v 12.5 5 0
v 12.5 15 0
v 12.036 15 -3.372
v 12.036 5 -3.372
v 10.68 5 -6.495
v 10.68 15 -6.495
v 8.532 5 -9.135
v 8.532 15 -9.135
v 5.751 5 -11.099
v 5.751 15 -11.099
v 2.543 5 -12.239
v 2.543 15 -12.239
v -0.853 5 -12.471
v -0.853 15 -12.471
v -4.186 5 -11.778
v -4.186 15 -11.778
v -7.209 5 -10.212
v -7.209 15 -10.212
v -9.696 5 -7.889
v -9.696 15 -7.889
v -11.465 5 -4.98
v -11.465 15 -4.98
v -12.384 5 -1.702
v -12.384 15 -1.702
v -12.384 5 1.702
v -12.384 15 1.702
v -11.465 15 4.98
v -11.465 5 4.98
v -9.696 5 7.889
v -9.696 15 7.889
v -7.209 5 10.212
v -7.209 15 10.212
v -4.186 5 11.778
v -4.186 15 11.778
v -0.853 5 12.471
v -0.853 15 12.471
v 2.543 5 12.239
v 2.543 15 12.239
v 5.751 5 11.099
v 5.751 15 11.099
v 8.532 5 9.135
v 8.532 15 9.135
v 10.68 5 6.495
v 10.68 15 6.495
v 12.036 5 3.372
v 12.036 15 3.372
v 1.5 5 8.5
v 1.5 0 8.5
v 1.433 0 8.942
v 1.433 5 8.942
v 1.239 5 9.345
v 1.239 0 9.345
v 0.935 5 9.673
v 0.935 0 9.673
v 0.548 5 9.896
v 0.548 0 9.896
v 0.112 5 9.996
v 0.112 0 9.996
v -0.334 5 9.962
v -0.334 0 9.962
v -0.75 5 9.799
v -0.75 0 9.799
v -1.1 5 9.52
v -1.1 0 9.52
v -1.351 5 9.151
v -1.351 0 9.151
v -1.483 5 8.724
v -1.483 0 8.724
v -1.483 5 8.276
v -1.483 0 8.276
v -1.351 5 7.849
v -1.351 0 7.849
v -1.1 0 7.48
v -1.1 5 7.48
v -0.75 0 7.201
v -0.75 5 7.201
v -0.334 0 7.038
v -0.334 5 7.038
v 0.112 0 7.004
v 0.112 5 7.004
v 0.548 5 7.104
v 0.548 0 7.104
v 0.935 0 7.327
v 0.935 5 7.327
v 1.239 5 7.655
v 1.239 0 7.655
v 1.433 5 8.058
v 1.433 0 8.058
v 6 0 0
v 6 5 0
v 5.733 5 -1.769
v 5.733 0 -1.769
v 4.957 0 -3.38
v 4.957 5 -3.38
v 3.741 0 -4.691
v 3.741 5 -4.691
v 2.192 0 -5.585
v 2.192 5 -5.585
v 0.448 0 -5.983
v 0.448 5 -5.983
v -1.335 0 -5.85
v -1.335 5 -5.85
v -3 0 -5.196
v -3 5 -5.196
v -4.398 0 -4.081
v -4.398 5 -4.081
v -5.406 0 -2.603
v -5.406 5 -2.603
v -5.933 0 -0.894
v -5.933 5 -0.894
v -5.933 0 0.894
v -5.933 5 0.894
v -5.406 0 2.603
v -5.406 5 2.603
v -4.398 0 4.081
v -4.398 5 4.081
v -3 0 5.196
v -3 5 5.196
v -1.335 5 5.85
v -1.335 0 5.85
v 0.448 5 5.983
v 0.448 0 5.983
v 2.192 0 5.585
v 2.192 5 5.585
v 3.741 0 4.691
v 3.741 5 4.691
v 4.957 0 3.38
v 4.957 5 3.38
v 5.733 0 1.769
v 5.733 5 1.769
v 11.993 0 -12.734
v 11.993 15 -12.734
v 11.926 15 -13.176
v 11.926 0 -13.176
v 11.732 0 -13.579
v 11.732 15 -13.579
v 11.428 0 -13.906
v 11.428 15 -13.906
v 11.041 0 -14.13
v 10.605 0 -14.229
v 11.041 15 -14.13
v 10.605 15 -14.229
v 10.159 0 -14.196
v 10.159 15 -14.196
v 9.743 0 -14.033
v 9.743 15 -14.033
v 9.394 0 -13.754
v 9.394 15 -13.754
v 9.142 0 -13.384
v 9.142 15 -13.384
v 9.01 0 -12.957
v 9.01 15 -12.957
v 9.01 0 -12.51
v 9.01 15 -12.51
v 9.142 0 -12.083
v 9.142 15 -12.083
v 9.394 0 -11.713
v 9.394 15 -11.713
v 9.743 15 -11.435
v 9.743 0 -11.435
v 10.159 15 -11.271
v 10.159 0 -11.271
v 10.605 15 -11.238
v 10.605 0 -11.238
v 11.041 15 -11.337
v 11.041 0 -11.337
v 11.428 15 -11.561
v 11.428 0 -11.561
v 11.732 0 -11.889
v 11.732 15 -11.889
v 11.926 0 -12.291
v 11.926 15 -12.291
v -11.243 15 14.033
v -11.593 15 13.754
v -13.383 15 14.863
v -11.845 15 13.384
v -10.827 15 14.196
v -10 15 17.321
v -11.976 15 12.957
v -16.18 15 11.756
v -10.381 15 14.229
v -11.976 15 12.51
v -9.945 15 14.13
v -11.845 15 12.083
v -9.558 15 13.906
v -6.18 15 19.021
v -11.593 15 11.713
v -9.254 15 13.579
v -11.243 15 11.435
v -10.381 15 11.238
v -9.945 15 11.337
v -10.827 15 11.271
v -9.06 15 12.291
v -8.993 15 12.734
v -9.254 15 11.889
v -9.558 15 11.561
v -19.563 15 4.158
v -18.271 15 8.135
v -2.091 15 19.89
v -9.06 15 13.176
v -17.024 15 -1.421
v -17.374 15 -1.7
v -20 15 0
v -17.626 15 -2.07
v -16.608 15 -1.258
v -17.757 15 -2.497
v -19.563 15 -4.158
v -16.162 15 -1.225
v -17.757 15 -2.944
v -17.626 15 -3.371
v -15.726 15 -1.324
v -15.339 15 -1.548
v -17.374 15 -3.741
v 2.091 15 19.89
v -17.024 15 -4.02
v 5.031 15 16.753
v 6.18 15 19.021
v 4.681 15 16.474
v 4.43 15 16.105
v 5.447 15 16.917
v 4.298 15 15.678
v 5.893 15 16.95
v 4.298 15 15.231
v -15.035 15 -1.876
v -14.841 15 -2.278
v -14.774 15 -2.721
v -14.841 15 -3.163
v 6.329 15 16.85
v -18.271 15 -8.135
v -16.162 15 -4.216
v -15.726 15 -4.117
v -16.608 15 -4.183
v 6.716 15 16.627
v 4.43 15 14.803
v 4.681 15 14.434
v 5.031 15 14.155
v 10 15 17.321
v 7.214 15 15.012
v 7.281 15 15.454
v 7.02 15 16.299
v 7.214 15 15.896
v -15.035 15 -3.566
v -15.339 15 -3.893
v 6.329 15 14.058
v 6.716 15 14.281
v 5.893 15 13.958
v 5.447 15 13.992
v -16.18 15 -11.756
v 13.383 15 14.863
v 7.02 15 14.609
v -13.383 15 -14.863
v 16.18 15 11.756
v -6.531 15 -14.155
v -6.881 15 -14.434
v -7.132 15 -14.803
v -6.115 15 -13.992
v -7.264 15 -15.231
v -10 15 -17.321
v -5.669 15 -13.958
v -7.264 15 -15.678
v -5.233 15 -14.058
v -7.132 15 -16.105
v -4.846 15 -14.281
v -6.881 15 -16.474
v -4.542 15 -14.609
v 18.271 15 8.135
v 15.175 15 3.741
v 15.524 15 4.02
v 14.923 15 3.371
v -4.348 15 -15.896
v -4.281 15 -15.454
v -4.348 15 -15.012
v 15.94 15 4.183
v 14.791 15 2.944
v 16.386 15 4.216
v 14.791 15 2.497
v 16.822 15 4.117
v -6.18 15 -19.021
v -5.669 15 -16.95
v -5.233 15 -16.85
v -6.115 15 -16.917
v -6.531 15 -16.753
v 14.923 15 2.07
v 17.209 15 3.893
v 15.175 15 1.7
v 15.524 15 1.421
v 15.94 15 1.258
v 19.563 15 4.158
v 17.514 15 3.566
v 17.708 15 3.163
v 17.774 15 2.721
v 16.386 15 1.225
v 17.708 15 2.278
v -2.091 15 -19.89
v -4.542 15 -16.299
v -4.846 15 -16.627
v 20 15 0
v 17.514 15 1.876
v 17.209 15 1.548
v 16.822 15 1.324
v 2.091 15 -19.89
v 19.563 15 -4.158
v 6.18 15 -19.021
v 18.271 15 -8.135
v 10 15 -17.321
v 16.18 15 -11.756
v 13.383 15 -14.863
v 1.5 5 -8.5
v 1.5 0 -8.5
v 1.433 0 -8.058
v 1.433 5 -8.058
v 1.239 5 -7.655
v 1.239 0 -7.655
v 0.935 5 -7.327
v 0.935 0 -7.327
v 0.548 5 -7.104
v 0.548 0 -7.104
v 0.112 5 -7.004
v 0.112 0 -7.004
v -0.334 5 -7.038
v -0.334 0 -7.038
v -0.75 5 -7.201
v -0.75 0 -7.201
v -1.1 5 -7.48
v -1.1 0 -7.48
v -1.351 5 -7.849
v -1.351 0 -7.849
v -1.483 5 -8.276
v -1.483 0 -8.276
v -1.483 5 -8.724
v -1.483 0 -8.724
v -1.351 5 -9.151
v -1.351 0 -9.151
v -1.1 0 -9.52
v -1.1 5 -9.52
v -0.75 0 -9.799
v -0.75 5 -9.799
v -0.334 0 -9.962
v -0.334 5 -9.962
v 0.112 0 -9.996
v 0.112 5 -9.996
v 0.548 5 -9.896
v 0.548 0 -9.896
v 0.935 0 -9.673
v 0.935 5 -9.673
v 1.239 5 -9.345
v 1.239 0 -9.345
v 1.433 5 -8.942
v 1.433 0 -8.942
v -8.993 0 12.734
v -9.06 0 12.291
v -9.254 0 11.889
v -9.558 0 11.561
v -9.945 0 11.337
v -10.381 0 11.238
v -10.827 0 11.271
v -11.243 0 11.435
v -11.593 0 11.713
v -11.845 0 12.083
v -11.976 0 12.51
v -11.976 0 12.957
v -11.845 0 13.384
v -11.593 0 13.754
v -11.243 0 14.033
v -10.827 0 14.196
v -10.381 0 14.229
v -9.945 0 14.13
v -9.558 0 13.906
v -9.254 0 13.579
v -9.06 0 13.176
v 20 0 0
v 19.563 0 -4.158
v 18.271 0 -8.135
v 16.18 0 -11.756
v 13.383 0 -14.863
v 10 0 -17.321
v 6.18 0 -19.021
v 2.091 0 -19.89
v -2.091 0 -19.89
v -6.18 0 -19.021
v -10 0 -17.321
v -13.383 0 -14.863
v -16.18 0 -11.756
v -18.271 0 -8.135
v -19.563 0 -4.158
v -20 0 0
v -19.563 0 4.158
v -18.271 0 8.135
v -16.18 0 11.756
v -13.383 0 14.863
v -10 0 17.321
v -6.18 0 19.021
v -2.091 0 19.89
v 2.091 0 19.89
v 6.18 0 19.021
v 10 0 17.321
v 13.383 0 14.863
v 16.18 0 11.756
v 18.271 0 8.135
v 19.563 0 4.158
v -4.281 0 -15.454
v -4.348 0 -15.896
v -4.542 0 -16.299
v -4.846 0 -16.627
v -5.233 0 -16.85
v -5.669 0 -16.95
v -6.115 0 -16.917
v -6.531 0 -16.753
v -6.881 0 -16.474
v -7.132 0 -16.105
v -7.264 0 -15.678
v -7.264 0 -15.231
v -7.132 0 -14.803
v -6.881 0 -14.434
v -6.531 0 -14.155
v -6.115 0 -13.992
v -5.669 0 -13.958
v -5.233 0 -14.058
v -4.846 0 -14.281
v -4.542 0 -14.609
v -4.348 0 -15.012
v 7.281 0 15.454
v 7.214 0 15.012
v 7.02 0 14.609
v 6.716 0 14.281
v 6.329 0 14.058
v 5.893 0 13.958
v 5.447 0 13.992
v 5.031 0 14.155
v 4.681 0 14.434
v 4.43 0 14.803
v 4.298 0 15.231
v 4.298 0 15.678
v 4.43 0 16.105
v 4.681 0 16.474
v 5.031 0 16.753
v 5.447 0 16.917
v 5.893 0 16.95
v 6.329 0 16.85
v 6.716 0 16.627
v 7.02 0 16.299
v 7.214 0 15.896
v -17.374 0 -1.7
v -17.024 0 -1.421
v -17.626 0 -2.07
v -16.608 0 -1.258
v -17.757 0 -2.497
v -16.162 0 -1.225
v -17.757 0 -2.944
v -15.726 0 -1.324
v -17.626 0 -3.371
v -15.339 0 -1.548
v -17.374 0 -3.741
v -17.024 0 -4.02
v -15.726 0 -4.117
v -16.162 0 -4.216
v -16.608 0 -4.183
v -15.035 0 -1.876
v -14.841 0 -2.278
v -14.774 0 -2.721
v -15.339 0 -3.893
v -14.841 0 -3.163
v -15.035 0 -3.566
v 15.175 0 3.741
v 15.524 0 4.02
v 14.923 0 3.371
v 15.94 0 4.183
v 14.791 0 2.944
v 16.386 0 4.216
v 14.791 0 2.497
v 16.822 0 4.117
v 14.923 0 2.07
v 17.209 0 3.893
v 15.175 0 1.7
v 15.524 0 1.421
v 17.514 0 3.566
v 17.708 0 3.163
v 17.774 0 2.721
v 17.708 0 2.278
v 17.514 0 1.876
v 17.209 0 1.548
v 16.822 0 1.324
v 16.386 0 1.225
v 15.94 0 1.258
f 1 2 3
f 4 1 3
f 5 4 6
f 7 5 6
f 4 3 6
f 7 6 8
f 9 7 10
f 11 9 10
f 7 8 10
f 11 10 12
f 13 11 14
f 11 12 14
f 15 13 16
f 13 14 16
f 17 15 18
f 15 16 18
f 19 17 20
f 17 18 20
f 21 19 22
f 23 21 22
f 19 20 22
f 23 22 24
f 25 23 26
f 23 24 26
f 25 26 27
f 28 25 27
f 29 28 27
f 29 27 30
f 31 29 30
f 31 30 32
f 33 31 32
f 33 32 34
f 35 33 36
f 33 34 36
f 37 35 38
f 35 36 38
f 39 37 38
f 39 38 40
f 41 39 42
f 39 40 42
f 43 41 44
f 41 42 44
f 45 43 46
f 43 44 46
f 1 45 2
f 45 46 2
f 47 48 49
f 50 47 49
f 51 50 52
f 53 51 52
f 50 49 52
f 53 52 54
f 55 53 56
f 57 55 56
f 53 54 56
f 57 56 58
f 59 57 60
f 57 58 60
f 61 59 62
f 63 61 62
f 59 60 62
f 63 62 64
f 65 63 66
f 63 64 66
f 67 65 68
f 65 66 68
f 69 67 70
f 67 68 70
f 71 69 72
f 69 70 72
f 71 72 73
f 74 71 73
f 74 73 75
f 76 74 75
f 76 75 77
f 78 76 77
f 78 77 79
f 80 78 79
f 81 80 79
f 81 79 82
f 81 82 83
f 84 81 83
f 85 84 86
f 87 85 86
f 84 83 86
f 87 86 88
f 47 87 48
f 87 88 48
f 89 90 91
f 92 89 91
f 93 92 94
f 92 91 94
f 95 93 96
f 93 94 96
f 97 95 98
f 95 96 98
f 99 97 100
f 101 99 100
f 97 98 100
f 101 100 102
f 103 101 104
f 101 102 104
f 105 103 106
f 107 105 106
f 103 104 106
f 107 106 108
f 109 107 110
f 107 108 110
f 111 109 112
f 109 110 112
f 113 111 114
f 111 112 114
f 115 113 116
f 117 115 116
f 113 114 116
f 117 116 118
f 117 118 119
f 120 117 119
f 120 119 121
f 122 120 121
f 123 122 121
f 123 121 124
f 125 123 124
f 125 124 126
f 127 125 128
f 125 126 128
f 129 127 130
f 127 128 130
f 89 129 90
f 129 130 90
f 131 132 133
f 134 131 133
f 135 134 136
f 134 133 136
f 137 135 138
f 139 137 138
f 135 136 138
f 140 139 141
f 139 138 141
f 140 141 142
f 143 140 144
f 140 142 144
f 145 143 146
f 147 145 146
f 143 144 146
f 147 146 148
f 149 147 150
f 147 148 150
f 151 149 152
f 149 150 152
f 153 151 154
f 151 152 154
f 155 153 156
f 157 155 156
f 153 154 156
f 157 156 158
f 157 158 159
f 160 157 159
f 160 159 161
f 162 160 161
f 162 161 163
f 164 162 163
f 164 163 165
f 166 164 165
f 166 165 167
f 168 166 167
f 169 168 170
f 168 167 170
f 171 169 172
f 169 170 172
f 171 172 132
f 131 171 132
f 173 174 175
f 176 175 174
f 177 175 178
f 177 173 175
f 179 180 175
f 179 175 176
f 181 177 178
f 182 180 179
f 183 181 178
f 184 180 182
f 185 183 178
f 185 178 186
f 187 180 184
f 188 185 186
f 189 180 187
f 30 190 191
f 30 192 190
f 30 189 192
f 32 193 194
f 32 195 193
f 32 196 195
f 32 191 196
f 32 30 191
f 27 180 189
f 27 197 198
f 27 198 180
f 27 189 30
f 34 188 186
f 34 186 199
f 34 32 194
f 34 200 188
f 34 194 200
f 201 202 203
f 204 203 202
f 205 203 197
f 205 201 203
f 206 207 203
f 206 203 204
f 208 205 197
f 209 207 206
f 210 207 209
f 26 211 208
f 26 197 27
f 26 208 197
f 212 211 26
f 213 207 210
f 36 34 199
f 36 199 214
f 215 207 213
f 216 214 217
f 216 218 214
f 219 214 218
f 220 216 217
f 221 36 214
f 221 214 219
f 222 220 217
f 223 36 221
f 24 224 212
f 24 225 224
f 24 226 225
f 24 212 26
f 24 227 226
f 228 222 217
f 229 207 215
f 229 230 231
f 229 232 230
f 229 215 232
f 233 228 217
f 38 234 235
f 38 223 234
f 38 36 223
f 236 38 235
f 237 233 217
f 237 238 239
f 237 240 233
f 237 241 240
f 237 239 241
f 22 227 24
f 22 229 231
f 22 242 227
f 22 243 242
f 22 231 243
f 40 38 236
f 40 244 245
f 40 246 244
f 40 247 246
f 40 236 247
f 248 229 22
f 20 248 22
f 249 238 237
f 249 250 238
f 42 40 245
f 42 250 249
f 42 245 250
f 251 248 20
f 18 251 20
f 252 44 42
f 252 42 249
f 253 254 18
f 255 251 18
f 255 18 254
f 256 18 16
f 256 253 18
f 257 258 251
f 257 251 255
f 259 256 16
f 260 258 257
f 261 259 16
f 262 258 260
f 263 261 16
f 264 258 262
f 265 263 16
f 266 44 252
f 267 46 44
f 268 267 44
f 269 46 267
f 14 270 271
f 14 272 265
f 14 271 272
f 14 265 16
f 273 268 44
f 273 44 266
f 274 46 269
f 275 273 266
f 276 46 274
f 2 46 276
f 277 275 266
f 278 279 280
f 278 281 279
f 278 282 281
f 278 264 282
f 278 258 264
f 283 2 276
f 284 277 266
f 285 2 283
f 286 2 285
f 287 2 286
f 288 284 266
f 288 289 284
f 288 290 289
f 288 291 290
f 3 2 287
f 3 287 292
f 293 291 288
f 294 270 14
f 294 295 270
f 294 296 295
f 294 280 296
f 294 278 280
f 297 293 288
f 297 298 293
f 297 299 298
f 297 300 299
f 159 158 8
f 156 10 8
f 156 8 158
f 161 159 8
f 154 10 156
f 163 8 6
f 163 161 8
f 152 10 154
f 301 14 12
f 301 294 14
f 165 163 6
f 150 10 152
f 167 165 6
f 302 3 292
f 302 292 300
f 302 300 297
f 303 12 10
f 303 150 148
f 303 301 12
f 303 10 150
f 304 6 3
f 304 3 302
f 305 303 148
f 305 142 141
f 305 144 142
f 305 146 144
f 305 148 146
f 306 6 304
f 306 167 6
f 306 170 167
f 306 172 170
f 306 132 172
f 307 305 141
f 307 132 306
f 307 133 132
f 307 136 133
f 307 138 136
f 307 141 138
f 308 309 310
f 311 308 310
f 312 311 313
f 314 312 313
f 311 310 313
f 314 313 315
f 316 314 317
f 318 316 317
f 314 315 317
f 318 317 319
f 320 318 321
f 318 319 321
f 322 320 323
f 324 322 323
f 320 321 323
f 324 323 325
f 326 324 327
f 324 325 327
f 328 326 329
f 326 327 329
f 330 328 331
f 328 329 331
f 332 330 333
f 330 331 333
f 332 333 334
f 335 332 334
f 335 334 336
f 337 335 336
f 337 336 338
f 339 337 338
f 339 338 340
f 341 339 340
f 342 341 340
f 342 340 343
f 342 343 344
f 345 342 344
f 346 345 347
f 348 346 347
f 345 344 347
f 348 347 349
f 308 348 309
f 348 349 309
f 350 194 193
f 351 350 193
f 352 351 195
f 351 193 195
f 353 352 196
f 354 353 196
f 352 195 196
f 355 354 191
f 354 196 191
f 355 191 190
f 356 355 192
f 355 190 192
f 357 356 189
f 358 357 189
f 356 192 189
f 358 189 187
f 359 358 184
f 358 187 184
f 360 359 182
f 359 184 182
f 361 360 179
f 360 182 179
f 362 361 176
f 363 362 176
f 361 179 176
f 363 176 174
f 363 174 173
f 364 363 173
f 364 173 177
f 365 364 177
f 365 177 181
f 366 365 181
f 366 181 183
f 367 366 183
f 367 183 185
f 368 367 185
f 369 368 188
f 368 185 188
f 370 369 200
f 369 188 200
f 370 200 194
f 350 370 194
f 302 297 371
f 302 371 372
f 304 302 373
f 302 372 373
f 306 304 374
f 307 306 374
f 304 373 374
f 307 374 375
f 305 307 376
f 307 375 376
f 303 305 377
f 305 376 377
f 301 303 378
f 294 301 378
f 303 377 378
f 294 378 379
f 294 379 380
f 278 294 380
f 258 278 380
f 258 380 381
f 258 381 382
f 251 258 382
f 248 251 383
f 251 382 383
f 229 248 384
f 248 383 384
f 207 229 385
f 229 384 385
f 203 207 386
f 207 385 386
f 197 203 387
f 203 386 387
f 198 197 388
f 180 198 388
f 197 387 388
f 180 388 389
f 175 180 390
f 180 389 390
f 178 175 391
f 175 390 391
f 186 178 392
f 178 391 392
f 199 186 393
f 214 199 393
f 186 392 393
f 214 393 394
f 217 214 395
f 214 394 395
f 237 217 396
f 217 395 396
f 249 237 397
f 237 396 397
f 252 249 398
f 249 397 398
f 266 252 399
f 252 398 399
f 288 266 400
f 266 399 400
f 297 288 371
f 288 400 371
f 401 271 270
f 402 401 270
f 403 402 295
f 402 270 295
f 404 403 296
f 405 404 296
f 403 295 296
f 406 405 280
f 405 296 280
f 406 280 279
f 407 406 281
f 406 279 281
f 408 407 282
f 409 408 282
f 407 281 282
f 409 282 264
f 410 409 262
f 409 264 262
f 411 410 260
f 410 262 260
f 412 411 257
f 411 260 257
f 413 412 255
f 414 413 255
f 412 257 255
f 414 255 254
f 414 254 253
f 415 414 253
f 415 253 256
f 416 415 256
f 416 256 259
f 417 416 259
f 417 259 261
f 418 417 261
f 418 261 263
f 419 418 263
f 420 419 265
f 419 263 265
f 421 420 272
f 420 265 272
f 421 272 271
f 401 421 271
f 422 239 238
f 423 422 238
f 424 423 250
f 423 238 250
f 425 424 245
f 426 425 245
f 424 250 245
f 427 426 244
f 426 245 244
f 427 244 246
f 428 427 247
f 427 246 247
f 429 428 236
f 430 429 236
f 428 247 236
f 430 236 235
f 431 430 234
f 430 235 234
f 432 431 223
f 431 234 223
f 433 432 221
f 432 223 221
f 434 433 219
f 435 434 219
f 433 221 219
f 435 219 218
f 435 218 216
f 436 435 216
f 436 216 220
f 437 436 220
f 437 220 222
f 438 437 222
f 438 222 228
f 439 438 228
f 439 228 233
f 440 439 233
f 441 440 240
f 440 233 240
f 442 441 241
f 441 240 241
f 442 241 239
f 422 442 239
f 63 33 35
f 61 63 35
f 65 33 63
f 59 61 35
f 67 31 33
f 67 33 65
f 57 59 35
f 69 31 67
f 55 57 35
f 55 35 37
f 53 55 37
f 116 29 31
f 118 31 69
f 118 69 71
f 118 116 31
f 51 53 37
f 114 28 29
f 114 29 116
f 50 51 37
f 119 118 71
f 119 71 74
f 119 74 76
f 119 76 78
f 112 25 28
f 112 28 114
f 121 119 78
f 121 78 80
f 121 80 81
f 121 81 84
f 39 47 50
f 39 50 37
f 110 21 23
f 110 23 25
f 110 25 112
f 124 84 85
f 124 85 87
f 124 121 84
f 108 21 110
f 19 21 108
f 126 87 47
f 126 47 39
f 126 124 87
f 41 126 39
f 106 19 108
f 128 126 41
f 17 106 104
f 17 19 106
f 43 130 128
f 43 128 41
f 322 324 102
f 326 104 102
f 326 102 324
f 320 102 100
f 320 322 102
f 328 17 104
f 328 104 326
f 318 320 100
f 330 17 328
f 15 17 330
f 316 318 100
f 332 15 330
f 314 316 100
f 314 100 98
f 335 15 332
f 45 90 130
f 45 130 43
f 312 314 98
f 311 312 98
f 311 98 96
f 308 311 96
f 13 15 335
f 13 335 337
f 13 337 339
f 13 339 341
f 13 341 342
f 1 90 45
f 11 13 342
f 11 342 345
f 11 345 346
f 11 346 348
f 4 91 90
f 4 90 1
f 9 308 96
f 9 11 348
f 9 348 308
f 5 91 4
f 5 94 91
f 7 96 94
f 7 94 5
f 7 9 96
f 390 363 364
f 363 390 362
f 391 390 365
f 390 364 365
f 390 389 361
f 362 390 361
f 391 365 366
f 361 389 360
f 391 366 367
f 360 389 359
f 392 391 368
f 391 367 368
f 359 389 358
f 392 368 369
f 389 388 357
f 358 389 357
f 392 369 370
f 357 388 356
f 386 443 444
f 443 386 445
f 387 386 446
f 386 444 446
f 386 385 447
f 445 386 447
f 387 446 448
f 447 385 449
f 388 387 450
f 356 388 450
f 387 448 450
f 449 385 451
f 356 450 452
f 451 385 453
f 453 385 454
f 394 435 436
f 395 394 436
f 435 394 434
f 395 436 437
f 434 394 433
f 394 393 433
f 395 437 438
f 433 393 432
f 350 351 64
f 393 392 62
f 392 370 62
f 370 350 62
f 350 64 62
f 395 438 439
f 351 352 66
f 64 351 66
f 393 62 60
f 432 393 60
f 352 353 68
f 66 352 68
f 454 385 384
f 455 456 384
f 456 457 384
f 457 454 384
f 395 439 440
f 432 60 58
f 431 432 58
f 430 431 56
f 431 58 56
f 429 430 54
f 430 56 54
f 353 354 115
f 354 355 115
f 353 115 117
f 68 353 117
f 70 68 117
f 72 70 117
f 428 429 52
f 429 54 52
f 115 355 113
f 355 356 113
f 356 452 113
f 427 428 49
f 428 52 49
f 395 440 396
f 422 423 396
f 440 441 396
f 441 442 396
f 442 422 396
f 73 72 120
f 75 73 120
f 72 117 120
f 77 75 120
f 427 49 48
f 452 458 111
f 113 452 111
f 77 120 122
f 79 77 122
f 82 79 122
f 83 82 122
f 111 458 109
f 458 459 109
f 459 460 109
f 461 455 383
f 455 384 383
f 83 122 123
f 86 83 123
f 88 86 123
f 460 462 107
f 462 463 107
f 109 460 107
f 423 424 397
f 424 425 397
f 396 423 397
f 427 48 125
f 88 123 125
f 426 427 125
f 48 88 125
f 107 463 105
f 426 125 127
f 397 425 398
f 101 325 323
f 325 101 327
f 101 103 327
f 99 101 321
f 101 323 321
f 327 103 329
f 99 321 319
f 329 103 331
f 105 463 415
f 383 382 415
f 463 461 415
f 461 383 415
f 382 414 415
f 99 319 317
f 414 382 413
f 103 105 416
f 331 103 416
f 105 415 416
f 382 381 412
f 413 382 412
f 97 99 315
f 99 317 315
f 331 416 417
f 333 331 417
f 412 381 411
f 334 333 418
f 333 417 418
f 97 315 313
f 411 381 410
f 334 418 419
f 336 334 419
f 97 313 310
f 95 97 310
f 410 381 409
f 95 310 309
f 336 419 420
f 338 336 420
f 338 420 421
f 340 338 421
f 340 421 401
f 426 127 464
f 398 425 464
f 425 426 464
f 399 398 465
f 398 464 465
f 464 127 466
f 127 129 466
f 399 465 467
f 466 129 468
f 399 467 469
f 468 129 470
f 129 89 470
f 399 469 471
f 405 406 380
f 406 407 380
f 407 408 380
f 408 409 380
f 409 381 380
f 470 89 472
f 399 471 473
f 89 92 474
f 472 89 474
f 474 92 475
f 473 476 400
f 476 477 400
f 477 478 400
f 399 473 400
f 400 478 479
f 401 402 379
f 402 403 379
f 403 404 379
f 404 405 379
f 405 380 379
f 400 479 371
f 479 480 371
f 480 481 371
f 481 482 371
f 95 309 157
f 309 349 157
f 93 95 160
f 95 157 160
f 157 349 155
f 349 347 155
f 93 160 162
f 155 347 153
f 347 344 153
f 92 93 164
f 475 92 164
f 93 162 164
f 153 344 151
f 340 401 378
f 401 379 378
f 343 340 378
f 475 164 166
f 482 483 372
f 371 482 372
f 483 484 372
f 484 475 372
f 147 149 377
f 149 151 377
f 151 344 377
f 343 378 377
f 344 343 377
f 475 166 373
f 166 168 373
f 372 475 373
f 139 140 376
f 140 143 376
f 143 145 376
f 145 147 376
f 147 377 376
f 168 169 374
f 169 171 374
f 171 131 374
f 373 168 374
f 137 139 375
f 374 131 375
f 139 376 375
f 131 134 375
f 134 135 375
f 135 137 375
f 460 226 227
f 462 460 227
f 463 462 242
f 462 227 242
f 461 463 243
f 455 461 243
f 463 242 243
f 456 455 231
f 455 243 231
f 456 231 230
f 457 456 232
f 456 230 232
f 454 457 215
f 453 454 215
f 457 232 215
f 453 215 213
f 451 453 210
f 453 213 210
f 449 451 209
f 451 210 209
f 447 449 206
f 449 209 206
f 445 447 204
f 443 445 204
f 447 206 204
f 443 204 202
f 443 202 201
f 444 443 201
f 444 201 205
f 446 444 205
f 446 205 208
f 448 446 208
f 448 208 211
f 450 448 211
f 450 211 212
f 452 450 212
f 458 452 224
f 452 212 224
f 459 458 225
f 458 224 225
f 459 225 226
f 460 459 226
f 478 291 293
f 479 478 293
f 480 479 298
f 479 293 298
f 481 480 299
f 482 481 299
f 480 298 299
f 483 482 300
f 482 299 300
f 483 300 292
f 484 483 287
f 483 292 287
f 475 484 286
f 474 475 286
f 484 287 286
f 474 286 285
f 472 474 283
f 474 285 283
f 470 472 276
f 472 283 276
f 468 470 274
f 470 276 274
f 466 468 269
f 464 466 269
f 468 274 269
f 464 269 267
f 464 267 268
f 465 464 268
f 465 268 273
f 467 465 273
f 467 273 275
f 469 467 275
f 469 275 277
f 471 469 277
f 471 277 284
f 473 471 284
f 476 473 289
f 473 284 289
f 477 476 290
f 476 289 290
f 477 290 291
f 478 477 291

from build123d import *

# Parameters (mm, degrees)
SKETCH1_R           = 20
BOSS_EXTRUDE1_DEPTH = 15
SKETCH2_R           = 12.5
CUT_EXTRUDE1_DEPTH  = 10
SKETCH3_R           = 6
CUT_EXTRUDE2_DEPTH  = 5
SKETCH4_R           = 1.5
CUT_EXTRUDE3_DEPTH  = 15
SKETCH5_R           = 1.5
CUT_EXTRUDE4_DEPTH  = 5


with BuildPart() as part:
    # Sketch1 → Boss-Extrude1 (new body)
    with BuildSketch(Plane(origin=(0, 0, 0), x_dir=(1, 0, 0), z_dir=(0, 1, 0))):
        Circle(SKETCH1_R)
    extrude(amount=BOSS_EXTRUDE1_DEPTH)

    # Sketch2 → Cut-Extrude1 (cut)
    with BuildSketch(Plane(origin=(0, 15, 0), x_dir=(1, 0, 0), z_dir=(0, 1, 0))):
        Circle(SKETCH2_R)
    extrude(amount=-CUT_EXTRUDE1_DEPTH, mode=Mode.SUBTRACT)

    # Sketch3 → Cut-Extrude2 (cut)
    with BuildSketch(Plane(origin=(0, 5, 0), x_dir=(1, 0, 0), z_dir=(0, 1, 0))):
        Circle(SKETCH3_R)
    extrude(amount=-CUT_EXTRUDE2_DEPTH, mode=Mode.SUBTRACT)

    # Sketch4 → Cut-Extrude3 (cut)
    with BuildSketch(Plane(origin=(0, 15, 0), x_dir=(1, 0, 0), z_dir=(0, 1, 0))):
        with Locations((-10.493132047, -12.733584721)):
            Circle(SKETCH4_R)
        with Locations((-16.274173873, 2.720526557)):
            Circle(SKETCH4_R)
        with Locations((-5.781041827, 15.454111278)):
            Circle(SKETCH4_R)
        with Locations((10.493132047, 12.733584721)):
            Circle(SKETCH4_R)
        with Locations((16.274173873, -2.720526557)):
            Circle(SKETCH4_R)
        with Locations((5.781041827, -15.454111278)):
            Circle(SKETCH4_R)
    extrude(amount=-CUT_EXTRUDE3_DEPTH, mode=Mode.SUBTRACT)

    # Sketch5 → Cut-Extrude4 (cut)
    with BuildSketch(Plane.XZ):
        with Locations((0, 8.5)):
            Circle(SKETCH5_R)
        with Locations((0, -8.5)):
            Circle(SKETCH5_R)
    extrude(amount=-CUT_EXTRUDE4_DEPTH, mode=Mode.SUBTRACT)


solid = part.part
